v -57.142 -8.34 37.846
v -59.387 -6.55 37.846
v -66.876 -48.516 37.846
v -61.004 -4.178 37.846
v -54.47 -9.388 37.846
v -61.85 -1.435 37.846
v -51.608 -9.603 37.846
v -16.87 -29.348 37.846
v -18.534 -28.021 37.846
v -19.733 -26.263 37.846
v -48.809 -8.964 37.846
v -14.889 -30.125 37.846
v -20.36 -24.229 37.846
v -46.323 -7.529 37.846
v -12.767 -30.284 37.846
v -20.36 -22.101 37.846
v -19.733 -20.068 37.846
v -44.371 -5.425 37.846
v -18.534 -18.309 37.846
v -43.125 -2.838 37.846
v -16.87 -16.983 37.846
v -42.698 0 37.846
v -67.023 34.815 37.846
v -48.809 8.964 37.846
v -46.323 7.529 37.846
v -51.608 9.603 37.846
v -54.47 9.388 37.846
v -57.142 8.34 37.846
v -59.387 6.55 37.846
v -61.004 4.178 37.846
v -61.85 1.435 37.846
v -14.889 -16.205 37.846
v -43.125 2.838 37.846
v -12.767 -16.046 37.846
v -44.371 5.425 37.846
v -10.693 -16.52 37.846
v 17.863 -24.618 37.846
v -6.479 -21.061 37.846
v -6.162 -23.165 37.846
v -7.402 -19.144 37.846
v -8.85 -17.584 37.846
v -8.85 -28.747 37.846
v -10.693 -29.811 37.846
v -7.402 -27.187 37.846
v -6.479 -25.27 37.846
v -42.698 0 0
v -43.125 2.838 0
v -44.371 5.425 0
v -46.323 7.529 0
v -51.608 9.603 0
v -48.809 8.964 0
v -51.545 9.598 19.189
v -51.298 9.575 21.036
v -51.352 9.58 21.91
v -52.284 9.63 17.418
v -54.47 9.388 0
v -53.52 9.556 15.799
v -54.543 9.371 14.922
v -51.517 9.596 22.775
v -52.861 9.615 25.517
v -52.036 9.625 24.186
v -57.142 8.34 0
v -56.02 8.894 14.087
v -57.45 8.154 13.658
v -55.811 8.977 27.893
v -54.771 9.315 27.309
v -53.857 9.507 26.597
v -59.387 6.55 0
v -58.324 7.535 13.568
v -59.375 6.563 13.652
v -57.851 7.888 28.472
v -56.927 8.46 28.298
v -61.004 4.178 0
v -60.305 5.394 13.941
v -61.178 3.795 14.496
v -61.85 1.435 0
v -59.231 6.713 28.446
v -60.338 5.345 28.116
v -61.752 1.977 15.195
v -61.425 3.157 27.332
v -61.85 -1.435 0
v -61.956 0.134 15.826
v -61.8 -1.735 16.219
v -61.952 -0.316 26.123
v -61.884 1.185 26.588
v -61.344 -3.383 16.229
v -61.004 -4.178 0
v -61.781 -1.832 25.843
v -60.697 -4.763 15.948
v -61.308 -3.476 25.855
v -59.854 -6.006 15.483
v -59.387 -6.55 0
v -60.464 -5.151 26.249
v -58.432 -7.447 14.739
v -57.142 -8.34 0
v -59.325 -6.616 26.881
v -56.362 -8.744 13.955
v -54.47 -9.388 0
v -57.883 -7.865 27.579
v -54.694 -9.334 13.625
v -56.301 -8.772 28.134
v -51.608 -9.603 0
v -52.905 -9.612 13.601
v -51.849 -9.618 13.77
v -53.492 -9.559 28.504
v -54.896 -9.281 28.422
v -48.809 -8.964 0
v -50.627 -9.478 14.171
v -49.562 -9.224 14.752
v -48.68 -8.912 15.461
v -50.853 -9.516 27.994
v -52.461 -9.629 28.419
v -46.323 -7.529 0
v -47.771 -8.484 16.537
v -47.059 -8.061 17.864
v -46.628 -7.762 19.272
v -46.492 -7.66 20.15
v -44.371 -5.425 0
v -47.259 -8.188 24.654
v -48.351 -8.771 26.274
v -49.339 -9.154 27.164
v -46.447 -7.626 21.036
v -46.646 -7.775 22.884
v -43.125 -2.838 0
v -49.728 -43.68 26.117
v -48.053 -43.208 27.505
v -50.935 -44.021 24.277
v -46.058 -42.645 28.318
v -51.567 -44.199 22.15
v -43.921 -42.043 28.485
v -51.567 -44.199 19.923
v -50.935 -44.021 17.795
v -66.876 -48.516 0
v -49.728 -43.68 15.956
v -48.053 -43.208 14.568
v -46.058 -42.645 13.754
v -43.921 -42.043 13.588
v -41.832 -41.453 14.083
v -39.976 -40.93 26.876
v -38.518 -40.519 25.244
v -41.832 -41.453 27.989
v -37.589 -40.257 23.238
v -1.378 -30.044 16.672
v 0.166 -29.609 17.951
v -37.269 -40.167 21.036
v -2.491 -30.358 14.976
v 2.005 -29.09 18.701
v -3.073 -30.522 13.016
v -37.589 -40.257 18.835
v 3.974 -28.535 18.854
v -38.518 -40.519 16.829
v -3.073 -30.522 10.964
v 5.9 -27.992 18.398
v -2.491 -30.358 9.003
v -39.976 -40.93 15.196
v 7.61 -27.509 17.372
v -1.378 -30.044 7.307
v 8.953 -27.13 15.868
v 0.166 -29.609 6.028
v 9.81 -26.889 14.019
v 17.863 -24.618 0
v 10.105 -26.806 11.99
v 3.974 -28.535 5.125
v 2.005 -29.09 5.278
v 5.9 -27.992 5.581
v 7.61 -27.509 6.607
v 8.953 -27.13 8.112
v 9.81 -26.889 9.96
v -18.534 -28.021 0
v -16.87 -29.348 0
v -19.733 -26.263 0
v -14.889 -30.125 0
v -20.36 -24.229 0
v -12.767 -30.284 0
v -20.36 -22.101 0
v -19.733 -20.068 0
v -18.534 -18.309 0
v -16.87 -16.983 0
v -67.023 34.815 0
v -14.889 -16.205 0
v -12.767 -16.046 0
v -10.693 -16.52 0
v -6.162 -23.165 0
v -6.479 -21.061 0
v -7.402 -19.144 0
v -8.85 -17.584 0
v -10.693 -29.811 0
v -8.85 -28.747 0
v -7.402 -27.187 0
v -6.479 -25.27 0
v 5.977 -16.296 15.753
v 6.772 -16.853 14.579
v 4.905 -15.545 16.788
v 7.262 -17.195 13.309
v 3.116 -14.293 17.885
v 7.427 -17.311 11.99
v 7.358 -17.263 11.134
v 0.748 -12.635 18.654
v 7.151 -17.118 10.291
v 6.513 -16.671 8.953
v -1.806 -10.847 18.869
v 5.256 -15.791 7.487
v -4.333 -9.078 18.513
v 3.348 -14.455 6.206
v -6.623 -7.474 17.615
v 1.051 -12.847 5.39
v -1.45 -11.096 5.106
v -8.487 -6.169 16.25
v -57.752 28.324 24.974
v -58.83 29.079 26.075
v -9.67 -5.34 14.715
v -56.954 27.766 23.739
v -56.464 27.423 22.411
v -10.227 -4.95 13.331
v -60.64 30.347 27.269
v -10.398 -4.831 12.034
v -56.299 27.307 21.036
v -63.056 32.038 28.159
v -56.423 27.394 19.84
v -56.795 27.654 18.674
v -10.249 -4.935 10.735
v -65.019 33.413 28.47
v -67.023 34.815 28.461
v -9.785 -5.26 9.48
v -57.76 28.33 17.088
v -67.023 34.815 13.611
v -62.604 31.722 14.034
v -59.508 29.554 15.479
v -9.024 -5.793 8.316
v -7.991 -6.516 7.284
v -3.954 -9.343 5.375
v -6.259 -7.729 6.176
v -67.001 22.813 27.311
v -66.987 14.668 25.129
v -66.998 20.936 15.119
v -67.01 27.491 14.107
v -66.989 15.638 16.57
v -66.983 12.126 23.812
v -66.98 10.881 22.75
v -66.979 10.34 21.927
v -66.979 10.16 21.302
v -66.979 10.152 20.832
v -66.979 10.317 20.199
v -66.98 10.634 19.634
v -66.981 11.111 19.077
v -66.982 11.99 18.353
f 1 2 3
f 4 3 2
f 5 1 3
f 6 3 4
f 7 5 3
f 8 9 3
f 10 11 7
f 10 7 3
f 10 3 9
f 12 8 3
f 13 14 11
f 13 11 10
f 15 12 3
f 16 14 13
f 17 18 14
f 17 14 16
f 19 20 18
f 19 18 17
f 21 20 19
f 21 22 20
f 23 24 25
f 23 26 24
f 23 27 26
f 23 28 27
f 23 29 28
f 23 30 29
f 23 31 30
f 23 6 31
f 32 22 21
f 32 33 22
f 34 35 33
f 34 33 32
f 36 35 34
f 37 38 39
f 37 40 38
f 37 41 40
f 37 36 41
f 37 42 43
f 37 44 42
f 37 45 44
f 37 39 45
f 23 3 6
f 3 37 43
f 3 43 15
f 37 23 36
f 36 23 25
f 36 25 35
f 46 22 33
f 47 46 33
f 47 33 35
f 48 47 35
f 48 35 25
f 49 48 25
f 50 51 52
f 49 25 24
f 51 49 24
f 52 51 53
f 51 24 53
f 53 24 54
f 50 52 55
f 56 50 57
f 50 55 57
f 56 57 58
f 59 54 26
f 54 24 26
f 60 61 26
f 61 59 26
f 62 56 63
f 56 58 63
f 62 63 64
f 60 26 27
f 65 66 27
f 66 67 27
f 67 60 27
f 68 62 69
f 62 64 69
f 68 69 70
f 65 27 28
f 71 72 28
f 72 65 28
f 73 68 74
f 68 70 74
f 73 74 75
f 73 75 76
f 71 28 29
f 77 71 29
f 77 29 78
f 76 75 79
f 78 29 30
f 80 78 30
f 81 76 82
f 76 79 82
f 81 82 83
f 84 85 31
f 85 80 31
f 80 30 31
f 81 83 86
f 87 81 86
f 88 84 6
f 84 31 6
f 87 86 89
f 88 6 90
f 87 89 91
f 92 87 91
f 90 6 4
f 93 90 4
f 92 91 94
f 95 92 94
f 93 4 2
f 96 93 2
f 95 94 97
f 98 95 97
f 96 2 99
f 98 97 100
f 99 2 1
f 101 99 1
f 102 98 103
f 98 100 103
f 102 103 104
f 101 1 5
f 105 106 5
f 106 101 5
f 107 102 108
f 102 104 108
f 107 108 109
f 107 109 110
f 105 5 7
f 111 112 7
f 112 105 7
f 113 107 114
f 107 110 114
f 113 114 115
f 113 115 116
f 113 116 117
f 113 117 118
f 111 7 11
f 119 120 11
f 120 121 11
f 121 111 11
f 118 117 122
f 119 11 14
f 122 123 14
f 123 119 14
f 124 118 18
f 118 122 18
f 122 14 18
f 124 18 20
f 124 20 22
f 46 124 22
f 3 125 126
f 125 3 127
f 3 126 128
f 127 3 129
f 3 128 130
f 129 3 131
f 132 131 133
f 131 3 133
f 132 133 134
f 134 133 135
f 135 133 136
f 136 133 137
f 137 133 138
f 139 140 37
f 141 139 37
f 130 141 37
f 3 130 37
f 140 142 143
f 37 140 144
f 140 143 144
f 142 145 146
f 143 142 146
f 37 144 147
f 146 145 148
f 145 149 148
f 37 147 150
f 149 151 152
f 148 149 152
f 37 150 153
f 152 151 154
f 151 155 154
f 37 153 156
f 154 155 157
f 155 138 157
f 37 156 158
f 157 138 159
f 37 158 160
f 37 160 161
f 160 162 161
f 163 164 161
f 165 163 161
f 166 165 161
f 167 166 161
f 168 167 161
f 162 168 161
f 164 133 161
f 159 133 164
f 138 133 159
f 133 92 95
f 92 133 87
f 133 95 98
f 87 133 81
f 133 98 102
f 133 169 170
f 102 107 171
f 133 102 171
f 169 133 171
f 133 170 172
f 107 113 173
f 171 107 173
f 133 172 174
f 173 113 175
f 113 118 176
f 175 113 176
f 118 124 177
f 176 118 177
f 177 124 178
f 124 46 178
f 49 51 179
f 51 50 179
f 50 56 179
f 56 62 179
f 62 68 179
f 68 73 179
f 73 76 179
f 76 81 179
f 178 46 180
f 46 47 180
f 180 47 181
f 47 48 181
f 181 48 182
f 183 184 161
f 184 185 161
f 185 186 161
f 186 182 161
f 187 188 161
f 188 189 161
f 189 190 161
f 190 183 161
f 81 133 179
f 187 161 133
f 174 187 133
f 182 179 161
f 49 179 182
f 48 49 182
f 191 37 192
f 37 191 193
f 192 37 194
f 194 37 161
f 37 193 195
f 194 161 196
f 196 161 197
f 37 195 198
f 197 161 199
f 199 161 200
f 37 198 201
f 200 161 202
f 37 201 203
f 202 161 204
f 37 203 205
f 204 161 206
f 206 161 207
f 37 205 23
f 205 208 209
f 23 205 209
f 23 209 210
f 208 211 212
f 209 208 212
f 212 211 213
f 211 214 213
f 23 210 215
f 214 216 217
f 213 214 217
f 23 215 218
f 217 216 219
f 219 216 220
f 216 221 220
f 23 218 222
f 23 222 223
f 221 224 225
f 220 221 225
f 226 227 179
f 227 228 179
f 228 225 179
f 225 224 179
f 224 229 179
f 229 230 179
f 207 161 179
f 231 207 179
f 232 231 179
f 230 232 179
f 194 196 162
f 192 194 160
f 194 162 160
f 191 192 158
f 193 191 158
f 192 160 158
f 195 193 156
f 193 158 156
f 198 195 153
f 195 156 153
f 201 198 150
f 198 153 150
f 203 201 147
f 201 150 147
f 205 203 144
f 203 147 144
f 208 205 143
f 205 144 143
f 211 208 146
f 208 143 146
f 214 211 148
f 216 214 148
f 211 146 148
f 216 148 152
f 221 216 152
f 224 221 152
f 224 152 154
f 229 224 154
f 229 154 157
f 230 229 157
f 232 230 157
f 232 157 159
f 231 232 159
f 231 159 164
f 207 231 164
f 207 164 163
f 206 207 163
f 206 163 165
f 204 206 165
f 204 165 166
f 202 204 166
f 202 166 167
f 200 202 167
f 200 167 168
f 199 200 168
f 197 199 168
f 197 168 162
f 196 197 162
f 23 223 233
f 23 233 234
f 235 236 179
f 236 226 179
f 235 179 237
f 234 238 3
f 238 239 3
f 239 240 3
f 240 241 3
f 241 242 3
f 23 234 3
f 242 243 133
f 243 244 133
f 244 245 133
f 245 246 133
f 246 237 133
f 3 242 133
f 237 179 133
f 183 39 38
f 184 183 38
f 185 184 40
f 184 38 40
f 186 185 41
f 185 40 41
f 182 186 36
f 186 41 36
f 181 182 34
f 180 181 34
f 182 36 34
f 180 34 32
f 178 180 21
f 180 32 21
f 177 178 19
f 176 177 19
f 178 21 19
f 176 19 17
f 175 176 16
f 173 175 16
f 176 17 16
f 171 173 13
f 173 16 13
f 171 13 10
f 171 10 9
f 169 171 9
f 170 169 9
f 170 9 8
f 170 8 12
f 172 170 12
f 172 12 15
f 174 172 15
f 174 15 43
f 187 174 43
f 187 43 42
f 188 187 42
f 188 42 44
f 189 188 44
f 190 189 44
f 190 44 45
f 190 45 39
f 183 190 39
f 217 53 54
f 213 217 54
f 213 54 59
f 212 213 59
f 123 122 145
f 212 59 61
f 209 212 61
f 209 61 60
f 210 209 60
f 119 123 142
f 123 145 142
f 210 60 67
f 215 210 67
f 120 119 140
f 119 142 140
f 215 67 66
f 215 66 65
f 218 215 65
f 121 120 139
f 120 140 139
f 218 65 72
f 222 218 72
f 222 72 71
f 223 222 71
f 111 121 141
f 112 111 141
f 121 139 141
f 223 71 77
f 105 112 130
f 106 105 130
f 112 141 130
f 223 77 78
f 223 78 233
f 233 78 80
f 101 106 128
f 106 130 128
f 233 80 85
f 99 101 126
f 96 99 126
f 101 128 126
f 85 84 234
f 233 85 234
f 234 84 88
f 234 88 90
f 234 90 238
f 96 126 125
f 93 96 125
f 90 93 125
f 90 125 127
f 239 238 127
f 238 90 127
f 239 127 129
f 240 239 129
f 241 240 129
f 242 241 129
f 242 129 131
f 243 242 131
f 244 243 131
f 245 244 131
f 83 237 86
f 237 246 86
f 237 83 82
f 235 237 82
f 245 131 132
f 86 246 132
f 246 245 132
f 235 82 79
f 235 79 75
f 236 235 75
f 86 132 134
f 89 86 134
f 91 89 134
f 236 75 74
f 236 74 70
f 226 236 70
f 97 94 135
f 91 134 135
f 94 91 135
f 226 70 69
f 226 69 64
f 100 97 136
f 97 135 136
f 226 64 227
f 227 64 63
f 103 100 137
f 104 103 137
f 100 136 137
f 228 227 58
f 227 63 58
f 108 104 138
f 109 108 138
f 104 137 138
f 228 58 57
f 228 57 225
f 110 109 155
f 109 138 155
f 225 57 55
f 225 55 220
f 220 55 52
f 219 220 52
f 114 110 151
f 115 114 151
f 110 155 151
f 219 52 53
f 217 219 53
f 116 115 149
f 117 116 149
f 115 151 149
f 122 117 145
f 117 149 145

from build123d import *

# Parameters (mm, degrees)
F1_DEPTH = 37.846
F2_R     = 7.4693971268
F3_DEPTH = 80.2441237786
F4_R     = 7.1391458969
F5_DEPTH = 37.847
F6_R     = 6.8840617495
F7_DEPTH = 80.2441237786
F8_R     = 9.6297626658
F9_DEPTH = 37.847


with BuildPart() as f1:
    # F0 (on Top) → F1 (new body)
    with BuildSketch(Plane.XY):
        Polygon((-67.0226588845, 34.8154716194), (-66.8756216764, -48.5164038837), (17.8625807166, -24.6178079396), align=None)
    extrude(amount=F1_DEPTH)

    # F2 (on face) → F3 (cut, through all)
    with BuildSketch(Plane(origin=(7.7474819604, -27.4705550039, 0), x_dir=(0.9624553813, 0.2714399364, 0), z_dir=(0.2714399364, -0.9624553813, 0))):
        with Locations((-54.2420856655, 21.0362523794)):
            Circle(F2_R)
    extrude(amount=-F3_DEPTH, mode=Mode.SUBTRACT)

    # F4 (on face) → F5 (cut, through all)
    with BuildSketch(Plane.XY.offset(37.846)):
        with Locations((-13.3007261902, -23.1652185321)):
            Circle(F4_R)
    extrude(amount=-F5_DEPTH, mode=Mode.SUBTRACT)

    # F6 (on face) → F7 (cut, through all)
    with BuildSketch(Plane(origin=(7.7474819604, -27.4705550039, 0), x_dir=(0.9624553813, 0.2714399364, 0), z_dir=(0.2714399364, -0.9624553813, 0))):
        with Locations((-4.4350521639, 11.9895972311)):
            Circle(F6_R)
    extrude(amount=-F7_DEPTH, mode=Mode.SUBTRACT)

    # F8 (on face) → F9 (cut, through all)
    with BuildSketch(Plane.XY.offset(37.846)):
        with Locations((-52.3273982108, 0)):
            Circle(F8_R)
    extrude(amount=-F9_DEPTH, mode=Mode.SUBTRACT)


solid = f1.part
